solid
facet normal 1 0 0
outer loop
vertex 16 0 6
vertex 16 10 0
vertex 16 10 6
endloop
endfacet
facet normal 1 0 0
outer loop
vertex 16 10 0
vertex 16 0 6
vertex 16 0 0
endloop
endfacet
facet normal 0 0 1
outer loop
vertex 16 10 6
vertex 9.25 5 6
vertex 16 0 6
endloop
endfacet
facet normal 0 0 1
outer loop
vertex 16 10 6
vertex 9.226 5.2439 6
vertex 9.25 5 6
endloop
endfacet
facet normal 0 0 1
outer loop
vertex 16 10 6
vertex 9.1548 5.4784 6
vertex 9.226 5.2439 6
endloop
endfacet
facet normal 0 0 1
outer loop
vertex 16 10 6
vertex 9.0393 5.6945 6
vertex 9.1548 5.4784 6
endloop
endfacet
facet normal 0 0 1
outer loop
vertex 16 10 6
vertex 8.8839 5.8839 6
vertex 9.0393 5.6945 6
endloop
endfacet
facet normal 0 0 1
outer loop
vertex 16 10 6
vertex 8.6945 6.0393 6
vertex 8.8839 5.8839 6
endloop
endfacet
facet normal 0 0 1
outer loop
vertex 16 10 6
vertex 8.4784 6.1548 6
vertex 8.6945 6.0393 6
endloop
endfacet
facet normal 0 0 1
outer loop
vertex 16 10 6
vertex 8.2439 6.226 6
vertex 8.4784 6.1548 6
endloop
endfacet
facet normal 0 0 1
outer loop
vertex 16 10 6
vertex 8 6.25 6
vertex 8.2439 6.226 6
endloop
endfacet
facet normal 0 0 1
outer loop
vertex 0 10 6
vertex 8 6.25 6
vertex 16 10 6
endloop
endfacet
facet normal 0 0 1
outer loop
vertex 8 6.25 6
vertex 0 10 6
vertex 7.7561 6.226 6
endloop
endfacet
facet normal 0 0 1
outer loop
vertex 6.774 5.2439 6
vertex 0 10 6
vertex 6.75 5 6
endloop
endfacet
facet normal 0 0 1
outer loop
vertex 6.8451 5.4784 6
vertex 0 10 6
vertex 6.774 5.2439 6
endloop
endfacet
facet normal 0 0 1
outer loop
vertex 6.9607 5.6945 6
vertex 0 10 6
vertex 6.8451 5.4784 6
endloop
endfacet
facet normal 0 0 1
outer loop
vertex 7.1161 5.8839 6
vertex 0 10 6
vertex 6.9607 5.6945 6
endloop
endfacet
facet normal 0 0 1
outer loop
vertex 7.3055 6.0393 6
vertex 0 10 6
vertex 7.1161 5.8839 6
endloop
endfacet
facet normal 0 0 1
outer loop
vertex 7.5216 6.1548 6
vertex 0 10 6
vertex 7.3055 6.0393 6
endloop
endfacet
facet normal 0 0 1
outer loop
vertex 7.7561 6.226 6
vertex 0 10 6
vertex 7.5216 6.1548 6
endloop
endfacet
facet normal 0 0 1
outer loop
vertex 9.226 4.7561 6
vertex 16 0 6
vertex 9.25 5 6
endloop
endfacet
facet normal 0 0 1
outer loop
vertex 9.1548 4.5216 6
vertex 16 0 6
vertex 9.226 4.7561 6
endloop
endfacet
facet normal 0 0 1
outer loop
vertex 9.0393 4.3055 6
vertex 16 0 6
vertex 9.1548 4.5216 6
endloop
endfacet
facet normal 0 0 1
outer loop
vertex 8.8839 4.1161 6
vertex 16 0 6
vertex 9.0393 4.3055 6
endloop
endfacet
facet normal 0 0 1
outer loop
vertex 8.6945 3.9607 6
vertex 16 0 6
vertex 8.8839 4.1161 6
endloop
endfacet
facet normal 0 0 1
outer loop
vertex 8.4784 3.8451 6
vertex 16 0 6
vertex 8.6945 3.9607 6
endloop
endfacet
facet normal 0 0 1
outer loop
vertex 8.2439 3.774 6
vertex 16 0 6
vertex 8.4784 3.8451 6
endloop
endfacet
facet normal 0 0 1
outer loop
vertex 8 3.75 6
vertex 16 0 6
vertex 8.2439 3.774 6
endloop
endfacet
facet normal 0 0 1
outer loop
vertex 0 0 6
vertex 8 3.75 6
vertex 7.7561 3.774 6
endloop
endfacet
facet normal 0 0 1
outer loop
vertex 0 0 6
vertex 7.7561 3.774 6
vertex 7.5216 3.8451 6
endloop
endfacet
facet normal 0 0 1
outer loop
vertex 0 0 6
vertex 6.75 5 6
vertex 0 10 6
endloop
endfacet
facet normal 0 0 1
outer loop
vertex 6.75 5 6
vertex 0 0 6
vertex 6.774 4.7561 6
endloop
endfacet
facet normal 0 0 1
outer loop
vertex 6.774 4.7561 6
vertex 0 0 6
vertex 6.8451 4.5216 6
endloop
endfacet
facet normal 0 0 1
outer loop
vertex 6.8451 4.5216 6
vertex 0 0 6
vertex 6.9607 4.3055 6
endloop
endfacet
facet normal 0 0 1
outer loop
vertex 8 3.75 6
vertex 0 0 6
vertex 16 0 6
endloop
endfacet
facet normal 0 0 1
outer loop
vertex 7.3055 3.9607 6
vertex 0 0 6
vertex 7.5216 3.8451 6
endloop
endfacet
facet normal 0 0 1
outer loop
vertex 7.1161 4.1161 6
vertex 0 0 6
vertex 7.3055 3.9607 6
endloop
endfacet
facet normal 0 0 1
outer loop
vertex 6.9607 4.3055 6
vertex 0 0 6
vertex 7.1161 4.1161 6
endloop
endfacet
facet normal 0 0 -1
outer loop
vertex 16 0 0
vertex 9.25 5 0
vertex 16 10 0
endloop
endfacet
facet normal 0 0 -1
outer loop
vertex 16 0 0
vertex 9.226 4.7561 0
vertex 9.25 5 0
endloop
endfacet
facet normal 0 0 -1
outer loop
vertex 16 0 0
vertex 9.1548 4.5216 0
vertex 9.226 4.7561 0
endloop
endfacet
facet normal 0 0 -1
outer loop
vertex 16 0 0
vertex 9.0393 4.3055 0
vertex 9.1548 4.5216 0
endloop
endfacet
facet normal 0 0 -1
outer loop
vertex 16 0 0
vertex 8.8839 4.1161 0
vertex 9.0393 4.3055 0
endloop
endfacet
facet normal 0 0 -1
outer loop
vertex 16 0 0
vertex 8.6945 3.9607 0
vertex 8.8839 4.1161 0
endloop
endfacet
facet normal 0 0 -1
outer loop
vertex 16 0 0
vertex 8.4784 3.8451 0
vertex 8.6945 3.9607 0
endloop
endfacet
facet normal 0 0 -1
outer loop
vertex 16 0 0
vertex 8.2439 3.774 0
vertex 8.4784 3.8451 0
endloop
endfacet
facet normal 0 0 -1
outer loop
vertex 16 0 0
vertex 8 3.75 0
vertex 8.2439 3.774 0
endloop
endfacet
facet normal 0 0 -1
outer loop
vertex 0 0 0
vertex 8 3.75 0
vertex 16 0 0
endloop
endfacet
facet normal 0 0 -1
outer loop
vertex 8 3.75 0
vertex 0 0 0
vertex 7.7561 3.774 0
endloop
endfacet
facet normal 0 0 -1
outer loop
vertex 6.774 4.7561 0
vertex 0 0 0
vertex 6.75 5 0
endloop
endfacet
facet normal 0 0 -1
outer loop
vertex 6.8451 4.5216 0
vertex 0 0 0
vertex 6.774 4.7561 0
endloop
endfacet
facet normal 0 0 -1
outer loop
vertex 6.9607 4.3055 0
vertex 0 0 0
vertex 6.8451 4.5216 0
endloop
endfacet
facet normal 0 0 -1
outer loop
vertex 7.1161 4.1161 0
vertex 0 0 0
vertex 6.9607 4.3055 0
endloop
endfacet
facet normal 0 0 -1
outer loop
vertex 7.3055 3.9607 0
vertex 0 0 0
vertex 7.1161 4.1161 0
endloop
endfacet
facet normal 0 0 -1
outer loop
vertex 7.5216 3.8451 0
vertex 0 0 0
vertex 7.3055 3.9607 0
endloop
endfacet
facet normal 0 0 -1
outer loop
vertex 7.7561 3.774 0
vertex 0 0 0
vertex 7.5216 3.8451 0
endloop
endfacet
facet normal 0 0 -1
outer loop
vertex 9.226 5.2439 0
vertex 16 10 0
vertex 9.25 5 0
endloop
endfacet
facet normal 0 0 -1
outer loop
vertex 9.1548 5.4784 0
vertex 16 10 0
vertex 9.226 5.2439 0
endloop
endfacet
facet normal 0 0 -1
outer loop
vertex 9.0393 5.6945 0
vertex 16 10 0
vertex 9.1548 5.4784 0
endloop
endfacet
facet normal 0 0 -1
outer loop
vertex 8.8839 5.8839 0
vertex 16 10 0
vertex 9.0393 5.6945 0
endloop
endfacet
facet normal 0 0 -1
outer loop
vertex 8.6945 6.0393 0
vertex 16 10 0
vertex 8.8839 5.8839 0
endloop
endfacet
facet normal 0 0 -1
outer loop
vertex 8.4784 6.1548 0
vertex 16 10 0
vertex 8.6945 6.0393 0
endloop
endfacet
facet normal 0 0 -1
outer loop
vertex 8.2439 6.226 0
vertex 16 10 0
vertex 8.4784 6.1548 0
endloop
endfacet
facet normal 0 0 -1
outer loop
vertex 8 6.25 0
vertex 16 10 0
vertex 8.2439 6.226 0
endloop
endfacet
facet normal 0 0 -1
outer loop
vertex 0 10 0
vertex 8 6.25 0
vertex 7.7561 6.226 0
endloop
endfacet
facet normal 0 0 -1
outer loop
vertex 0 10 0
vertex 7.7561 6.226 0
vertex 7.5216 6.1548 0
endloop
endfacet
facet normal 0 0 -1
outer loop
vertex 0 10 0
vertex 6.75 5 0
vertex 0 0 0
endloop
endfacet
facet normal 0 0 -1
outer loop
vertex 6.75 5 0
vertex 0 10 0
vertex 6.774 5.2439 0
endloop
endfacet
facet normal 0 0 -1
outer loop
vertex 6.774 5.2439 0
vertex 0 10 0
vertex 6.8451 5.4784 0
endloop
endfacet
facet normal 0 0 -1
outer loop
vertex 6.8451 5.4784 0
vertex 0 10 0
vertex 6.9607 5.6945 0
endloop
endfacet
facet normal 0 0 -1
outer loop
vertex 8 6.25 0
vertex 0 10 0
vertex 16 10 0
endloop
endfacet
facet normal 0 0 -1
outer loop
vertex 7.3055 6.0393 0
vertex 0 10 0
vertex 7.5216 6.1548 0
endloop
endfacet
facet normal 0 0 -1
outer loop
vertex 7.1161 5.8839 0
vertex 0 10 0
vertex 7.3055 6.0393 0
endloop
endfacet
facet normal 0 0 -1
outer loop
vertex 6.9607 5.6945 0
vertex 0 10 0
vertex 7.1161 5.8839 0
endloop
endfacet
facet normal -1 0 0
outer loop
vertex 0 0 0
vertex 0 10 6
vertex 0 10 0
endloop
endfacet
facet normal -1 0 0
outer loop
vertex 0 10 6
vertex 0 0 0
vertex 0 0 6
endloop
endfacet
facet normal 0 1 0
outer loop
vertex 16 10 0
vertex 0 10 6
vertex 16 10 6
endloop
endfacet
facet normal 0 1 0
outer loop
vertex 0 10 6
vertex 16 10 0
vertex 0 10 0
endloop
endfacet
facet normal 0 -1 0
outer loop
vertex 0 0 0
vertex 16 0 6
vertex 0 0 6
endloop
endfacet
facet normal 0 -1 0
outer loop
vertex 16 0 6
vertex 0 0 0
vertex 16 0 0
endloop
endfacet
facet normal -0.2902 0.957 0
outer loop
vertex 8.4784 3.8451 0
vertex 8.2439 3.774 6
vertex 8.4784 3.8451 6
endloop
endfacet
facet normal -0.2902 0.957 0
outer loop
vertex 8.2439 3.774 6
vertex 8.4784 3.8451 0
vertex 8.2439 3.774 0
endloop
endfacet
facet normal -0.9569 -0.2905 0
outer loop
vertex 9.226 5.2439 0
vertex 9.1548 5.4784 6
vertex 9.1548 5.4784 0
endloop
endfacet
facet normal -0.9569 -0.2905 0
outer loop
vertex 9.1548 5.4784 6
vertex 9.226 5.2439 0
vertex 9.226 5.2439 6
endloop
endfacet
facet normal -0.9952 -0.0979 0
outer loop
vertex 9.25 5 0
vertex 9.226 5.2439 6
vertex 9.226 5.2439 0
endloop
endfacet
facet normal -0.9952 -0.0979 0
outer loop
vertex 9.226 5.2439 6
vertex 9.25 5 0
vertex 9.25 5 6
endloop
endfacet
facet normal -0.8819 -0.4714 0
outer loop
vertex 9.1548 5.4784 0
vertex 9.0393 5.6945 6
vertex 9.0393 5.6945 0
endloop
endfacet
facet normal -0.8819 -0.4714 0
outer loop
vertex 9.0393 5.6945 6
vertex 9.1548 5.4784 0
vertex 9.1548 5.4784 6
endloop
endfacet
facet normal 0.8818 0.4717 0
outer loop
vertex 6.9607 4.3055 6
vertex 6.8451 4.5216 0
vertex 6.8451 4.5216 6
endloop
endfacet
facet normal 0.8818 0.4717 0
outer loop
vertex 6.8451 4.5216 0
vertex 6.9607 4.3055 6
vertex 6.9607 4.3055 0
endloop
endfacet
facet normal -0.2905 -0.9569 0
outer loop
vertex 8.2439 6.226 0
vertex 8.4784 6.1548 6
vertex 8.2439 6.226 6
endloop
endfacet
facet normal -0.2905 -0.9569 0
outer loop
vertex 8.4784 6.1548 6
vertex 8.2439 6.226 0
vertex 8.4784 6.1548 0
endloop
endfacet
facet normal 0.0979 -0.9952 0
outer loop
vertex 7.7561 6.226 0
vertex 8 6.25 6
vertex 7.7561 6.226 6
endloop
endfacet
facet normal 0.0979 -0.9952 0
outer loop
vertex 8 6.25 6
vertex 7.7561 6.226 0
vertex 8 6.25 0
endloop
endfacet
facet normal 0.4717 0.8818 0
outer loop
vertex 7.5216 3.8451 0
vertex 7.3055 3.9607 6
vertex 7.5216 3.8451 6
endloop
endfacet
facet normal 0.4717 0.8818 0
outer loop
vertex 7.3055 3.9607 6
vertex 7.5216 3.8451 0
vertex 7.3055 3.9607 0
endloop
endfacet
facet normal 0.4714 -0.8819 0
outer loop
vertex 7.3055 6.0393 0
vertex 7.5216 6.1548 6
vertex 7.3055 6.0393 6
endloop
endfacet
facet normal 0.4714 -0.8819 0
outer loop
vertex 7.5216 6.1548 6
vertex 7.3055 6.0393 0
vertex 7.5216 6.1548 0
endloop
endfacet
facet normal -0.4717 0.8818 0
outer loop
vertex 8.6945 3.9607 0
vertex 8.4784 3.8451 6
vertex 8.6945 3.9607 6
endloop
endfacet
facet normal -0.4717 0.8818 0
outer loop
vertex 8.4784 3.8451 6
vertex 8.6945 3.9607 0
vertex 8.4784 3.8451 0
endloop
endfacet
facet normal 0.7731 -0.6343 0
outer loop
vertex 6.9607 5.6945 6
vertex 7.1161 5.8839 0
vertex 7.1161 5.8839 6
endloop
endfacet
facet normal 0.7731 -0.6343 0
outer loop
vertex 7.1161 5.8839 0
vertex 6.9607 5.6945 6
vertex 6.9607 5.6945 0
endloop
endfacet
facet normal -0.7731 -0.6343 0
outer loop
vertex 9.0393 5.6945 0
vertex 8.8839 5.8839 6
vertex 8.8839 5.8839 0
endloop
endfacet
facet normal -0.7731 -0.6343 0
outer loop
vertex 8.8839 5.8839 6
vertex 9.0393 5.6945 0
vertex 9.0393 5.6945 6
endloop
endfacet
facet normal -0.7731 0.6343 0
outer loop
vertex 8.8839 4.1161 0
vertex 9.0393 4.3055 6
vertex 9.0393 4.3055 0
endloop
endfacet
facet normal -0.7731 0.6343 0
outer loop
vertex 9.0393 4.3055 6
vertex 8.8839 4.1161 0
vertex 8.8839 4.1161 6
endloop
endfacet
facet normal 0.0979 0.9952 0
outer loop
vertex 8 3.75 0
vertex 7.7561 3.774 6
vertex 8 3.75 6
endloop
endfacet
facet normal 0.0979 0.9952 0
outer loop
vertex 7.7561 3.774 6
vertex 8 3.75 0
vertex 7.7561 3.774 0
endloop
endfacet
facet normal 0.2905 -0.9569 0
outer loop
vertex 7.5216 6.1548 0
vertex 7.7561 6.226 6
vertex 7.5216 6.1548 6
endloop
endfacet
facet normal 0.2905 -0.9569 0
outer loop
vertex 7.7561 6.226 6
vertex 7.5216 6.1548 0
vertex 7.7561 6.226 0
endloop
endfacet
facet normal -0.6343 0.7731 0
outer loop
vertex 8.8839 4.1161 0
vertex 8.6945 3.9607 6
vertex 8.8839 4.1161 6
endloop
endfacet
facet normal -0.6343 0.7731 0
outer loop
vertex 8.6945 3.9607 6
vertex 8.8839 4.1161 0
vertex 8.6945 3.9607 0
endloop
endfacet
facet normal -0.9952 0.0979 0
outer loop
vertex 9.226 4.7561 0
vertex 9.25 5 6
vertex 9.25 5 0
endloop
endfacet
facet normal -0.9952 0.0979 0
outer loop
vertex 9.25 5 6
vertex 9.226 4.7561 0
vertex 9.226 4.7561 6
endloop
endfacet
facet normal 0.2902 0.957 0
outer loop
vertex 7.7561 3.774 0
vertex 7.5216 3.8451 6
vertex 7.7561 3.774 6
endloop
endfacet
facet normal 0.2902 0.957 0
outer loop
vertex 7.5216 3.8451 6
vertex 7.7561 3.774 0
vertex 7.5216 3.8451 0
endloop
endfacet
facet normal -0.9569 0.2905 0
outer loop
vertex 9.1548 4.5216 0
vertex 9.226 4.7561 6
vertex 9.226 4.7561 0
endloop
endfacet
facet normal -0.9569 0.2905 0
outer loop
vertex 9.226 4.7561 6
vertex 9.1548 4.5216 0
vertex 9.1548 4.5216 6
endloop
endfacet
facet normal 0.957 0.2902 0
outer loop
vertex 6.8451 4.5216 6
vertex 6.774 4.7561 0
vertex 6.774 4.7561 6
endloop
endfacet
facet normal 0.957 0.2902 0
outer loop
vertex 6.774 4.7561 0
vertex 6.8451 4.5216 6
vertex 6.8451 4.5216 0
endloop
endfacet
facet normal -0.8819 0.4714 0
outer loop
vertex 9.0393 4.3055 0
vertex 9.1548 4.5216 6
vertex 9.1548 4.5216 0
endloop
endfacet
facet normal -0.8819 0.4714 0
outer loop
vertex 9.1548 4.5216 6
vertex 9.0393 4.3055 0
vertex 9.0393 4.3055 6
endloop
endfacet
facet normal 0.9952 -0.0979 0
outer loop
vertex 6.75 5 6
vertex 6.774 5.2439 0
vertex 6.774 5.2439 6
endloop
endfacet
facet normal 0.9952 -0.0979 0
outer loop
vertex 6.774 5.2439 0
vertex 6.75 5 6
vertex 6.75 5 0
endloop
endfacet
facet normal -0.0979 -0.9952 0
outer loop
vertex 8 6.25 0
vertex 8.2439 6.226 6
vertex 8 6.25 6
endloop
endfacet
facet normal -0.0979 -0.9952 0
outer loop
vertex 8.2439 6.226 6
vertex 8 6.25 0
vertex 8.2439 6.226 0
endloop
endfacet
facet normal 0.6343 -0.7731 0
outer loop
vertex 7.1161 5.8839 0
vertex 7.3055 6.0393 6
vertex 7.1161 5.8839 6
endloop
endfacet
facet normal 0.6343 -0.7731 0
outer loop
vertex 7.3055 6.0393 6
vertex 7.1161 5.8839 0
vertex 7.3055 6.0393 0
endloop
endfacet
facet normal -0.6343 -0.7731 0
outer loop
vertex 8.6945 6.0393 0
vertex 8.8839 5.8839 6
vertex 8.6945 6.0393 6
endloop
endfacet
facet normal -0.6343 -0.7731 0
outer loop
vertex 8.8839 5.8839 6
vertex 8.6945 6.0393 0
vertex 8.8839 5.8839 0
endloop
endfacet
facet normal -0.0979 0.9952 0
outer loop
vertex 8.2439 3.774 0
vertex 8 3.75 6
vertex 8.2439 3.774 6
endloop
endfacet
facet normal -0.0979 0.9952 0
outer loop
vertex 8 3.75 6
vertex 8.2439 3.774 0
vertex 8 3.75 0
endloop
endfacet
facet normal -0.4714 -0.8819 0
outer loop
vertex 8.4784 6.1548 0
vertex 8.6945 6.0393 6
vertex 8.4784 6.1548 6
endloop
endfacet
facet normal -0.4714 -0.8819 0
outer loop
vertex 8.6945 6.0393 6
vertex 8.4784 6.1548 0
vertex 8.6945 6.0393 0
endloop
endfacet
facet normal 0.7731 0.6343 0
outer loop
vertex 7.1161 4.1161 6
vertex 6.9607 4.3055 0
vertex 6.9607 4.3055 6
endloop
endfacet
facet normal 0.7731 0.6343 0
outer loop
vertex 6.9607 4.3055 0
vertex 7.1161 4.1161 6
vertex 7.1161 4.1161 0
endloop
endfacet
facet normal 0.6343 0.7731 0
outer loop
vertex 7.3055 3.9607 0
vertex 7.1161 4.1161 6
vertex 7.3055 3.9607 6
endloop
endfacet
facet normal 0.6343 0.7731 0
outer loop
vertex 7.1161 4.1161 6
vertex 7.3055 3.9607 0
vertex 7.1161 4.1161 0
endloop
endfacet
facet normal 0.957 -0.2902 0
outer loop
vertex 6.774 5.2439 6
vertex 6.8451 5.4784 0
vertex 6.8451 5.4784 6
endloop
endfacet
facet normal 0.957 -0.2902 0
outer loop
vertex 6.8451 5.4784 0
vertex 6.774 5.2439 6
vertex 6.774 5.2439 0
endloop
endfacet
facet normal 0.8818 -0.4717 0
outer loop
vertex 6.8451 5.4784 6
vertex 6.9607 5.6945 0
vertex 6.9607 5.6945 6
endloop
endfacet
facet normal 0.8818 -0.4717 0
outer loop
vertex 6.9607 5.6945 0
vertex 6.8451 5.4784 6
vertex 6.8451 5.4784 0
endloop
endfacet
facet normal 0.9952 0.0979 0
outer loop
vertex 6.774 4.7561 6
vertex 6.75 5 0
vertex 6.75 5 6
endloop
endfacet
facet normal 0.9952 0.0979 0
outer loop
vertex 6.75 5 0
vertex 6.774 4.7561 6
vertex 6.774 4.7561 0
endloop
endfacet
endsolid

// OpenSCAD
$fn = 32;

// ----------------------------------------------------------------------
// Micro pad: drilled pad, 5-20 mm class
// ----------------------------------------------------------------------

// --- parameters (mm) ---
pad_l = 16;               // pad length, X
pad_w = 10;               // pad width, Y
pad_t = 6;                // pad thickness, Z
hole_d = 2.5;             // through hole diameter

difference() {
  cube([pad_l, pad_w, pad_t]);
  translate([pad_l / 2, pad_w / 2, -1])
    cylinder(h = pad_t + 2, d = hole_d);
}
